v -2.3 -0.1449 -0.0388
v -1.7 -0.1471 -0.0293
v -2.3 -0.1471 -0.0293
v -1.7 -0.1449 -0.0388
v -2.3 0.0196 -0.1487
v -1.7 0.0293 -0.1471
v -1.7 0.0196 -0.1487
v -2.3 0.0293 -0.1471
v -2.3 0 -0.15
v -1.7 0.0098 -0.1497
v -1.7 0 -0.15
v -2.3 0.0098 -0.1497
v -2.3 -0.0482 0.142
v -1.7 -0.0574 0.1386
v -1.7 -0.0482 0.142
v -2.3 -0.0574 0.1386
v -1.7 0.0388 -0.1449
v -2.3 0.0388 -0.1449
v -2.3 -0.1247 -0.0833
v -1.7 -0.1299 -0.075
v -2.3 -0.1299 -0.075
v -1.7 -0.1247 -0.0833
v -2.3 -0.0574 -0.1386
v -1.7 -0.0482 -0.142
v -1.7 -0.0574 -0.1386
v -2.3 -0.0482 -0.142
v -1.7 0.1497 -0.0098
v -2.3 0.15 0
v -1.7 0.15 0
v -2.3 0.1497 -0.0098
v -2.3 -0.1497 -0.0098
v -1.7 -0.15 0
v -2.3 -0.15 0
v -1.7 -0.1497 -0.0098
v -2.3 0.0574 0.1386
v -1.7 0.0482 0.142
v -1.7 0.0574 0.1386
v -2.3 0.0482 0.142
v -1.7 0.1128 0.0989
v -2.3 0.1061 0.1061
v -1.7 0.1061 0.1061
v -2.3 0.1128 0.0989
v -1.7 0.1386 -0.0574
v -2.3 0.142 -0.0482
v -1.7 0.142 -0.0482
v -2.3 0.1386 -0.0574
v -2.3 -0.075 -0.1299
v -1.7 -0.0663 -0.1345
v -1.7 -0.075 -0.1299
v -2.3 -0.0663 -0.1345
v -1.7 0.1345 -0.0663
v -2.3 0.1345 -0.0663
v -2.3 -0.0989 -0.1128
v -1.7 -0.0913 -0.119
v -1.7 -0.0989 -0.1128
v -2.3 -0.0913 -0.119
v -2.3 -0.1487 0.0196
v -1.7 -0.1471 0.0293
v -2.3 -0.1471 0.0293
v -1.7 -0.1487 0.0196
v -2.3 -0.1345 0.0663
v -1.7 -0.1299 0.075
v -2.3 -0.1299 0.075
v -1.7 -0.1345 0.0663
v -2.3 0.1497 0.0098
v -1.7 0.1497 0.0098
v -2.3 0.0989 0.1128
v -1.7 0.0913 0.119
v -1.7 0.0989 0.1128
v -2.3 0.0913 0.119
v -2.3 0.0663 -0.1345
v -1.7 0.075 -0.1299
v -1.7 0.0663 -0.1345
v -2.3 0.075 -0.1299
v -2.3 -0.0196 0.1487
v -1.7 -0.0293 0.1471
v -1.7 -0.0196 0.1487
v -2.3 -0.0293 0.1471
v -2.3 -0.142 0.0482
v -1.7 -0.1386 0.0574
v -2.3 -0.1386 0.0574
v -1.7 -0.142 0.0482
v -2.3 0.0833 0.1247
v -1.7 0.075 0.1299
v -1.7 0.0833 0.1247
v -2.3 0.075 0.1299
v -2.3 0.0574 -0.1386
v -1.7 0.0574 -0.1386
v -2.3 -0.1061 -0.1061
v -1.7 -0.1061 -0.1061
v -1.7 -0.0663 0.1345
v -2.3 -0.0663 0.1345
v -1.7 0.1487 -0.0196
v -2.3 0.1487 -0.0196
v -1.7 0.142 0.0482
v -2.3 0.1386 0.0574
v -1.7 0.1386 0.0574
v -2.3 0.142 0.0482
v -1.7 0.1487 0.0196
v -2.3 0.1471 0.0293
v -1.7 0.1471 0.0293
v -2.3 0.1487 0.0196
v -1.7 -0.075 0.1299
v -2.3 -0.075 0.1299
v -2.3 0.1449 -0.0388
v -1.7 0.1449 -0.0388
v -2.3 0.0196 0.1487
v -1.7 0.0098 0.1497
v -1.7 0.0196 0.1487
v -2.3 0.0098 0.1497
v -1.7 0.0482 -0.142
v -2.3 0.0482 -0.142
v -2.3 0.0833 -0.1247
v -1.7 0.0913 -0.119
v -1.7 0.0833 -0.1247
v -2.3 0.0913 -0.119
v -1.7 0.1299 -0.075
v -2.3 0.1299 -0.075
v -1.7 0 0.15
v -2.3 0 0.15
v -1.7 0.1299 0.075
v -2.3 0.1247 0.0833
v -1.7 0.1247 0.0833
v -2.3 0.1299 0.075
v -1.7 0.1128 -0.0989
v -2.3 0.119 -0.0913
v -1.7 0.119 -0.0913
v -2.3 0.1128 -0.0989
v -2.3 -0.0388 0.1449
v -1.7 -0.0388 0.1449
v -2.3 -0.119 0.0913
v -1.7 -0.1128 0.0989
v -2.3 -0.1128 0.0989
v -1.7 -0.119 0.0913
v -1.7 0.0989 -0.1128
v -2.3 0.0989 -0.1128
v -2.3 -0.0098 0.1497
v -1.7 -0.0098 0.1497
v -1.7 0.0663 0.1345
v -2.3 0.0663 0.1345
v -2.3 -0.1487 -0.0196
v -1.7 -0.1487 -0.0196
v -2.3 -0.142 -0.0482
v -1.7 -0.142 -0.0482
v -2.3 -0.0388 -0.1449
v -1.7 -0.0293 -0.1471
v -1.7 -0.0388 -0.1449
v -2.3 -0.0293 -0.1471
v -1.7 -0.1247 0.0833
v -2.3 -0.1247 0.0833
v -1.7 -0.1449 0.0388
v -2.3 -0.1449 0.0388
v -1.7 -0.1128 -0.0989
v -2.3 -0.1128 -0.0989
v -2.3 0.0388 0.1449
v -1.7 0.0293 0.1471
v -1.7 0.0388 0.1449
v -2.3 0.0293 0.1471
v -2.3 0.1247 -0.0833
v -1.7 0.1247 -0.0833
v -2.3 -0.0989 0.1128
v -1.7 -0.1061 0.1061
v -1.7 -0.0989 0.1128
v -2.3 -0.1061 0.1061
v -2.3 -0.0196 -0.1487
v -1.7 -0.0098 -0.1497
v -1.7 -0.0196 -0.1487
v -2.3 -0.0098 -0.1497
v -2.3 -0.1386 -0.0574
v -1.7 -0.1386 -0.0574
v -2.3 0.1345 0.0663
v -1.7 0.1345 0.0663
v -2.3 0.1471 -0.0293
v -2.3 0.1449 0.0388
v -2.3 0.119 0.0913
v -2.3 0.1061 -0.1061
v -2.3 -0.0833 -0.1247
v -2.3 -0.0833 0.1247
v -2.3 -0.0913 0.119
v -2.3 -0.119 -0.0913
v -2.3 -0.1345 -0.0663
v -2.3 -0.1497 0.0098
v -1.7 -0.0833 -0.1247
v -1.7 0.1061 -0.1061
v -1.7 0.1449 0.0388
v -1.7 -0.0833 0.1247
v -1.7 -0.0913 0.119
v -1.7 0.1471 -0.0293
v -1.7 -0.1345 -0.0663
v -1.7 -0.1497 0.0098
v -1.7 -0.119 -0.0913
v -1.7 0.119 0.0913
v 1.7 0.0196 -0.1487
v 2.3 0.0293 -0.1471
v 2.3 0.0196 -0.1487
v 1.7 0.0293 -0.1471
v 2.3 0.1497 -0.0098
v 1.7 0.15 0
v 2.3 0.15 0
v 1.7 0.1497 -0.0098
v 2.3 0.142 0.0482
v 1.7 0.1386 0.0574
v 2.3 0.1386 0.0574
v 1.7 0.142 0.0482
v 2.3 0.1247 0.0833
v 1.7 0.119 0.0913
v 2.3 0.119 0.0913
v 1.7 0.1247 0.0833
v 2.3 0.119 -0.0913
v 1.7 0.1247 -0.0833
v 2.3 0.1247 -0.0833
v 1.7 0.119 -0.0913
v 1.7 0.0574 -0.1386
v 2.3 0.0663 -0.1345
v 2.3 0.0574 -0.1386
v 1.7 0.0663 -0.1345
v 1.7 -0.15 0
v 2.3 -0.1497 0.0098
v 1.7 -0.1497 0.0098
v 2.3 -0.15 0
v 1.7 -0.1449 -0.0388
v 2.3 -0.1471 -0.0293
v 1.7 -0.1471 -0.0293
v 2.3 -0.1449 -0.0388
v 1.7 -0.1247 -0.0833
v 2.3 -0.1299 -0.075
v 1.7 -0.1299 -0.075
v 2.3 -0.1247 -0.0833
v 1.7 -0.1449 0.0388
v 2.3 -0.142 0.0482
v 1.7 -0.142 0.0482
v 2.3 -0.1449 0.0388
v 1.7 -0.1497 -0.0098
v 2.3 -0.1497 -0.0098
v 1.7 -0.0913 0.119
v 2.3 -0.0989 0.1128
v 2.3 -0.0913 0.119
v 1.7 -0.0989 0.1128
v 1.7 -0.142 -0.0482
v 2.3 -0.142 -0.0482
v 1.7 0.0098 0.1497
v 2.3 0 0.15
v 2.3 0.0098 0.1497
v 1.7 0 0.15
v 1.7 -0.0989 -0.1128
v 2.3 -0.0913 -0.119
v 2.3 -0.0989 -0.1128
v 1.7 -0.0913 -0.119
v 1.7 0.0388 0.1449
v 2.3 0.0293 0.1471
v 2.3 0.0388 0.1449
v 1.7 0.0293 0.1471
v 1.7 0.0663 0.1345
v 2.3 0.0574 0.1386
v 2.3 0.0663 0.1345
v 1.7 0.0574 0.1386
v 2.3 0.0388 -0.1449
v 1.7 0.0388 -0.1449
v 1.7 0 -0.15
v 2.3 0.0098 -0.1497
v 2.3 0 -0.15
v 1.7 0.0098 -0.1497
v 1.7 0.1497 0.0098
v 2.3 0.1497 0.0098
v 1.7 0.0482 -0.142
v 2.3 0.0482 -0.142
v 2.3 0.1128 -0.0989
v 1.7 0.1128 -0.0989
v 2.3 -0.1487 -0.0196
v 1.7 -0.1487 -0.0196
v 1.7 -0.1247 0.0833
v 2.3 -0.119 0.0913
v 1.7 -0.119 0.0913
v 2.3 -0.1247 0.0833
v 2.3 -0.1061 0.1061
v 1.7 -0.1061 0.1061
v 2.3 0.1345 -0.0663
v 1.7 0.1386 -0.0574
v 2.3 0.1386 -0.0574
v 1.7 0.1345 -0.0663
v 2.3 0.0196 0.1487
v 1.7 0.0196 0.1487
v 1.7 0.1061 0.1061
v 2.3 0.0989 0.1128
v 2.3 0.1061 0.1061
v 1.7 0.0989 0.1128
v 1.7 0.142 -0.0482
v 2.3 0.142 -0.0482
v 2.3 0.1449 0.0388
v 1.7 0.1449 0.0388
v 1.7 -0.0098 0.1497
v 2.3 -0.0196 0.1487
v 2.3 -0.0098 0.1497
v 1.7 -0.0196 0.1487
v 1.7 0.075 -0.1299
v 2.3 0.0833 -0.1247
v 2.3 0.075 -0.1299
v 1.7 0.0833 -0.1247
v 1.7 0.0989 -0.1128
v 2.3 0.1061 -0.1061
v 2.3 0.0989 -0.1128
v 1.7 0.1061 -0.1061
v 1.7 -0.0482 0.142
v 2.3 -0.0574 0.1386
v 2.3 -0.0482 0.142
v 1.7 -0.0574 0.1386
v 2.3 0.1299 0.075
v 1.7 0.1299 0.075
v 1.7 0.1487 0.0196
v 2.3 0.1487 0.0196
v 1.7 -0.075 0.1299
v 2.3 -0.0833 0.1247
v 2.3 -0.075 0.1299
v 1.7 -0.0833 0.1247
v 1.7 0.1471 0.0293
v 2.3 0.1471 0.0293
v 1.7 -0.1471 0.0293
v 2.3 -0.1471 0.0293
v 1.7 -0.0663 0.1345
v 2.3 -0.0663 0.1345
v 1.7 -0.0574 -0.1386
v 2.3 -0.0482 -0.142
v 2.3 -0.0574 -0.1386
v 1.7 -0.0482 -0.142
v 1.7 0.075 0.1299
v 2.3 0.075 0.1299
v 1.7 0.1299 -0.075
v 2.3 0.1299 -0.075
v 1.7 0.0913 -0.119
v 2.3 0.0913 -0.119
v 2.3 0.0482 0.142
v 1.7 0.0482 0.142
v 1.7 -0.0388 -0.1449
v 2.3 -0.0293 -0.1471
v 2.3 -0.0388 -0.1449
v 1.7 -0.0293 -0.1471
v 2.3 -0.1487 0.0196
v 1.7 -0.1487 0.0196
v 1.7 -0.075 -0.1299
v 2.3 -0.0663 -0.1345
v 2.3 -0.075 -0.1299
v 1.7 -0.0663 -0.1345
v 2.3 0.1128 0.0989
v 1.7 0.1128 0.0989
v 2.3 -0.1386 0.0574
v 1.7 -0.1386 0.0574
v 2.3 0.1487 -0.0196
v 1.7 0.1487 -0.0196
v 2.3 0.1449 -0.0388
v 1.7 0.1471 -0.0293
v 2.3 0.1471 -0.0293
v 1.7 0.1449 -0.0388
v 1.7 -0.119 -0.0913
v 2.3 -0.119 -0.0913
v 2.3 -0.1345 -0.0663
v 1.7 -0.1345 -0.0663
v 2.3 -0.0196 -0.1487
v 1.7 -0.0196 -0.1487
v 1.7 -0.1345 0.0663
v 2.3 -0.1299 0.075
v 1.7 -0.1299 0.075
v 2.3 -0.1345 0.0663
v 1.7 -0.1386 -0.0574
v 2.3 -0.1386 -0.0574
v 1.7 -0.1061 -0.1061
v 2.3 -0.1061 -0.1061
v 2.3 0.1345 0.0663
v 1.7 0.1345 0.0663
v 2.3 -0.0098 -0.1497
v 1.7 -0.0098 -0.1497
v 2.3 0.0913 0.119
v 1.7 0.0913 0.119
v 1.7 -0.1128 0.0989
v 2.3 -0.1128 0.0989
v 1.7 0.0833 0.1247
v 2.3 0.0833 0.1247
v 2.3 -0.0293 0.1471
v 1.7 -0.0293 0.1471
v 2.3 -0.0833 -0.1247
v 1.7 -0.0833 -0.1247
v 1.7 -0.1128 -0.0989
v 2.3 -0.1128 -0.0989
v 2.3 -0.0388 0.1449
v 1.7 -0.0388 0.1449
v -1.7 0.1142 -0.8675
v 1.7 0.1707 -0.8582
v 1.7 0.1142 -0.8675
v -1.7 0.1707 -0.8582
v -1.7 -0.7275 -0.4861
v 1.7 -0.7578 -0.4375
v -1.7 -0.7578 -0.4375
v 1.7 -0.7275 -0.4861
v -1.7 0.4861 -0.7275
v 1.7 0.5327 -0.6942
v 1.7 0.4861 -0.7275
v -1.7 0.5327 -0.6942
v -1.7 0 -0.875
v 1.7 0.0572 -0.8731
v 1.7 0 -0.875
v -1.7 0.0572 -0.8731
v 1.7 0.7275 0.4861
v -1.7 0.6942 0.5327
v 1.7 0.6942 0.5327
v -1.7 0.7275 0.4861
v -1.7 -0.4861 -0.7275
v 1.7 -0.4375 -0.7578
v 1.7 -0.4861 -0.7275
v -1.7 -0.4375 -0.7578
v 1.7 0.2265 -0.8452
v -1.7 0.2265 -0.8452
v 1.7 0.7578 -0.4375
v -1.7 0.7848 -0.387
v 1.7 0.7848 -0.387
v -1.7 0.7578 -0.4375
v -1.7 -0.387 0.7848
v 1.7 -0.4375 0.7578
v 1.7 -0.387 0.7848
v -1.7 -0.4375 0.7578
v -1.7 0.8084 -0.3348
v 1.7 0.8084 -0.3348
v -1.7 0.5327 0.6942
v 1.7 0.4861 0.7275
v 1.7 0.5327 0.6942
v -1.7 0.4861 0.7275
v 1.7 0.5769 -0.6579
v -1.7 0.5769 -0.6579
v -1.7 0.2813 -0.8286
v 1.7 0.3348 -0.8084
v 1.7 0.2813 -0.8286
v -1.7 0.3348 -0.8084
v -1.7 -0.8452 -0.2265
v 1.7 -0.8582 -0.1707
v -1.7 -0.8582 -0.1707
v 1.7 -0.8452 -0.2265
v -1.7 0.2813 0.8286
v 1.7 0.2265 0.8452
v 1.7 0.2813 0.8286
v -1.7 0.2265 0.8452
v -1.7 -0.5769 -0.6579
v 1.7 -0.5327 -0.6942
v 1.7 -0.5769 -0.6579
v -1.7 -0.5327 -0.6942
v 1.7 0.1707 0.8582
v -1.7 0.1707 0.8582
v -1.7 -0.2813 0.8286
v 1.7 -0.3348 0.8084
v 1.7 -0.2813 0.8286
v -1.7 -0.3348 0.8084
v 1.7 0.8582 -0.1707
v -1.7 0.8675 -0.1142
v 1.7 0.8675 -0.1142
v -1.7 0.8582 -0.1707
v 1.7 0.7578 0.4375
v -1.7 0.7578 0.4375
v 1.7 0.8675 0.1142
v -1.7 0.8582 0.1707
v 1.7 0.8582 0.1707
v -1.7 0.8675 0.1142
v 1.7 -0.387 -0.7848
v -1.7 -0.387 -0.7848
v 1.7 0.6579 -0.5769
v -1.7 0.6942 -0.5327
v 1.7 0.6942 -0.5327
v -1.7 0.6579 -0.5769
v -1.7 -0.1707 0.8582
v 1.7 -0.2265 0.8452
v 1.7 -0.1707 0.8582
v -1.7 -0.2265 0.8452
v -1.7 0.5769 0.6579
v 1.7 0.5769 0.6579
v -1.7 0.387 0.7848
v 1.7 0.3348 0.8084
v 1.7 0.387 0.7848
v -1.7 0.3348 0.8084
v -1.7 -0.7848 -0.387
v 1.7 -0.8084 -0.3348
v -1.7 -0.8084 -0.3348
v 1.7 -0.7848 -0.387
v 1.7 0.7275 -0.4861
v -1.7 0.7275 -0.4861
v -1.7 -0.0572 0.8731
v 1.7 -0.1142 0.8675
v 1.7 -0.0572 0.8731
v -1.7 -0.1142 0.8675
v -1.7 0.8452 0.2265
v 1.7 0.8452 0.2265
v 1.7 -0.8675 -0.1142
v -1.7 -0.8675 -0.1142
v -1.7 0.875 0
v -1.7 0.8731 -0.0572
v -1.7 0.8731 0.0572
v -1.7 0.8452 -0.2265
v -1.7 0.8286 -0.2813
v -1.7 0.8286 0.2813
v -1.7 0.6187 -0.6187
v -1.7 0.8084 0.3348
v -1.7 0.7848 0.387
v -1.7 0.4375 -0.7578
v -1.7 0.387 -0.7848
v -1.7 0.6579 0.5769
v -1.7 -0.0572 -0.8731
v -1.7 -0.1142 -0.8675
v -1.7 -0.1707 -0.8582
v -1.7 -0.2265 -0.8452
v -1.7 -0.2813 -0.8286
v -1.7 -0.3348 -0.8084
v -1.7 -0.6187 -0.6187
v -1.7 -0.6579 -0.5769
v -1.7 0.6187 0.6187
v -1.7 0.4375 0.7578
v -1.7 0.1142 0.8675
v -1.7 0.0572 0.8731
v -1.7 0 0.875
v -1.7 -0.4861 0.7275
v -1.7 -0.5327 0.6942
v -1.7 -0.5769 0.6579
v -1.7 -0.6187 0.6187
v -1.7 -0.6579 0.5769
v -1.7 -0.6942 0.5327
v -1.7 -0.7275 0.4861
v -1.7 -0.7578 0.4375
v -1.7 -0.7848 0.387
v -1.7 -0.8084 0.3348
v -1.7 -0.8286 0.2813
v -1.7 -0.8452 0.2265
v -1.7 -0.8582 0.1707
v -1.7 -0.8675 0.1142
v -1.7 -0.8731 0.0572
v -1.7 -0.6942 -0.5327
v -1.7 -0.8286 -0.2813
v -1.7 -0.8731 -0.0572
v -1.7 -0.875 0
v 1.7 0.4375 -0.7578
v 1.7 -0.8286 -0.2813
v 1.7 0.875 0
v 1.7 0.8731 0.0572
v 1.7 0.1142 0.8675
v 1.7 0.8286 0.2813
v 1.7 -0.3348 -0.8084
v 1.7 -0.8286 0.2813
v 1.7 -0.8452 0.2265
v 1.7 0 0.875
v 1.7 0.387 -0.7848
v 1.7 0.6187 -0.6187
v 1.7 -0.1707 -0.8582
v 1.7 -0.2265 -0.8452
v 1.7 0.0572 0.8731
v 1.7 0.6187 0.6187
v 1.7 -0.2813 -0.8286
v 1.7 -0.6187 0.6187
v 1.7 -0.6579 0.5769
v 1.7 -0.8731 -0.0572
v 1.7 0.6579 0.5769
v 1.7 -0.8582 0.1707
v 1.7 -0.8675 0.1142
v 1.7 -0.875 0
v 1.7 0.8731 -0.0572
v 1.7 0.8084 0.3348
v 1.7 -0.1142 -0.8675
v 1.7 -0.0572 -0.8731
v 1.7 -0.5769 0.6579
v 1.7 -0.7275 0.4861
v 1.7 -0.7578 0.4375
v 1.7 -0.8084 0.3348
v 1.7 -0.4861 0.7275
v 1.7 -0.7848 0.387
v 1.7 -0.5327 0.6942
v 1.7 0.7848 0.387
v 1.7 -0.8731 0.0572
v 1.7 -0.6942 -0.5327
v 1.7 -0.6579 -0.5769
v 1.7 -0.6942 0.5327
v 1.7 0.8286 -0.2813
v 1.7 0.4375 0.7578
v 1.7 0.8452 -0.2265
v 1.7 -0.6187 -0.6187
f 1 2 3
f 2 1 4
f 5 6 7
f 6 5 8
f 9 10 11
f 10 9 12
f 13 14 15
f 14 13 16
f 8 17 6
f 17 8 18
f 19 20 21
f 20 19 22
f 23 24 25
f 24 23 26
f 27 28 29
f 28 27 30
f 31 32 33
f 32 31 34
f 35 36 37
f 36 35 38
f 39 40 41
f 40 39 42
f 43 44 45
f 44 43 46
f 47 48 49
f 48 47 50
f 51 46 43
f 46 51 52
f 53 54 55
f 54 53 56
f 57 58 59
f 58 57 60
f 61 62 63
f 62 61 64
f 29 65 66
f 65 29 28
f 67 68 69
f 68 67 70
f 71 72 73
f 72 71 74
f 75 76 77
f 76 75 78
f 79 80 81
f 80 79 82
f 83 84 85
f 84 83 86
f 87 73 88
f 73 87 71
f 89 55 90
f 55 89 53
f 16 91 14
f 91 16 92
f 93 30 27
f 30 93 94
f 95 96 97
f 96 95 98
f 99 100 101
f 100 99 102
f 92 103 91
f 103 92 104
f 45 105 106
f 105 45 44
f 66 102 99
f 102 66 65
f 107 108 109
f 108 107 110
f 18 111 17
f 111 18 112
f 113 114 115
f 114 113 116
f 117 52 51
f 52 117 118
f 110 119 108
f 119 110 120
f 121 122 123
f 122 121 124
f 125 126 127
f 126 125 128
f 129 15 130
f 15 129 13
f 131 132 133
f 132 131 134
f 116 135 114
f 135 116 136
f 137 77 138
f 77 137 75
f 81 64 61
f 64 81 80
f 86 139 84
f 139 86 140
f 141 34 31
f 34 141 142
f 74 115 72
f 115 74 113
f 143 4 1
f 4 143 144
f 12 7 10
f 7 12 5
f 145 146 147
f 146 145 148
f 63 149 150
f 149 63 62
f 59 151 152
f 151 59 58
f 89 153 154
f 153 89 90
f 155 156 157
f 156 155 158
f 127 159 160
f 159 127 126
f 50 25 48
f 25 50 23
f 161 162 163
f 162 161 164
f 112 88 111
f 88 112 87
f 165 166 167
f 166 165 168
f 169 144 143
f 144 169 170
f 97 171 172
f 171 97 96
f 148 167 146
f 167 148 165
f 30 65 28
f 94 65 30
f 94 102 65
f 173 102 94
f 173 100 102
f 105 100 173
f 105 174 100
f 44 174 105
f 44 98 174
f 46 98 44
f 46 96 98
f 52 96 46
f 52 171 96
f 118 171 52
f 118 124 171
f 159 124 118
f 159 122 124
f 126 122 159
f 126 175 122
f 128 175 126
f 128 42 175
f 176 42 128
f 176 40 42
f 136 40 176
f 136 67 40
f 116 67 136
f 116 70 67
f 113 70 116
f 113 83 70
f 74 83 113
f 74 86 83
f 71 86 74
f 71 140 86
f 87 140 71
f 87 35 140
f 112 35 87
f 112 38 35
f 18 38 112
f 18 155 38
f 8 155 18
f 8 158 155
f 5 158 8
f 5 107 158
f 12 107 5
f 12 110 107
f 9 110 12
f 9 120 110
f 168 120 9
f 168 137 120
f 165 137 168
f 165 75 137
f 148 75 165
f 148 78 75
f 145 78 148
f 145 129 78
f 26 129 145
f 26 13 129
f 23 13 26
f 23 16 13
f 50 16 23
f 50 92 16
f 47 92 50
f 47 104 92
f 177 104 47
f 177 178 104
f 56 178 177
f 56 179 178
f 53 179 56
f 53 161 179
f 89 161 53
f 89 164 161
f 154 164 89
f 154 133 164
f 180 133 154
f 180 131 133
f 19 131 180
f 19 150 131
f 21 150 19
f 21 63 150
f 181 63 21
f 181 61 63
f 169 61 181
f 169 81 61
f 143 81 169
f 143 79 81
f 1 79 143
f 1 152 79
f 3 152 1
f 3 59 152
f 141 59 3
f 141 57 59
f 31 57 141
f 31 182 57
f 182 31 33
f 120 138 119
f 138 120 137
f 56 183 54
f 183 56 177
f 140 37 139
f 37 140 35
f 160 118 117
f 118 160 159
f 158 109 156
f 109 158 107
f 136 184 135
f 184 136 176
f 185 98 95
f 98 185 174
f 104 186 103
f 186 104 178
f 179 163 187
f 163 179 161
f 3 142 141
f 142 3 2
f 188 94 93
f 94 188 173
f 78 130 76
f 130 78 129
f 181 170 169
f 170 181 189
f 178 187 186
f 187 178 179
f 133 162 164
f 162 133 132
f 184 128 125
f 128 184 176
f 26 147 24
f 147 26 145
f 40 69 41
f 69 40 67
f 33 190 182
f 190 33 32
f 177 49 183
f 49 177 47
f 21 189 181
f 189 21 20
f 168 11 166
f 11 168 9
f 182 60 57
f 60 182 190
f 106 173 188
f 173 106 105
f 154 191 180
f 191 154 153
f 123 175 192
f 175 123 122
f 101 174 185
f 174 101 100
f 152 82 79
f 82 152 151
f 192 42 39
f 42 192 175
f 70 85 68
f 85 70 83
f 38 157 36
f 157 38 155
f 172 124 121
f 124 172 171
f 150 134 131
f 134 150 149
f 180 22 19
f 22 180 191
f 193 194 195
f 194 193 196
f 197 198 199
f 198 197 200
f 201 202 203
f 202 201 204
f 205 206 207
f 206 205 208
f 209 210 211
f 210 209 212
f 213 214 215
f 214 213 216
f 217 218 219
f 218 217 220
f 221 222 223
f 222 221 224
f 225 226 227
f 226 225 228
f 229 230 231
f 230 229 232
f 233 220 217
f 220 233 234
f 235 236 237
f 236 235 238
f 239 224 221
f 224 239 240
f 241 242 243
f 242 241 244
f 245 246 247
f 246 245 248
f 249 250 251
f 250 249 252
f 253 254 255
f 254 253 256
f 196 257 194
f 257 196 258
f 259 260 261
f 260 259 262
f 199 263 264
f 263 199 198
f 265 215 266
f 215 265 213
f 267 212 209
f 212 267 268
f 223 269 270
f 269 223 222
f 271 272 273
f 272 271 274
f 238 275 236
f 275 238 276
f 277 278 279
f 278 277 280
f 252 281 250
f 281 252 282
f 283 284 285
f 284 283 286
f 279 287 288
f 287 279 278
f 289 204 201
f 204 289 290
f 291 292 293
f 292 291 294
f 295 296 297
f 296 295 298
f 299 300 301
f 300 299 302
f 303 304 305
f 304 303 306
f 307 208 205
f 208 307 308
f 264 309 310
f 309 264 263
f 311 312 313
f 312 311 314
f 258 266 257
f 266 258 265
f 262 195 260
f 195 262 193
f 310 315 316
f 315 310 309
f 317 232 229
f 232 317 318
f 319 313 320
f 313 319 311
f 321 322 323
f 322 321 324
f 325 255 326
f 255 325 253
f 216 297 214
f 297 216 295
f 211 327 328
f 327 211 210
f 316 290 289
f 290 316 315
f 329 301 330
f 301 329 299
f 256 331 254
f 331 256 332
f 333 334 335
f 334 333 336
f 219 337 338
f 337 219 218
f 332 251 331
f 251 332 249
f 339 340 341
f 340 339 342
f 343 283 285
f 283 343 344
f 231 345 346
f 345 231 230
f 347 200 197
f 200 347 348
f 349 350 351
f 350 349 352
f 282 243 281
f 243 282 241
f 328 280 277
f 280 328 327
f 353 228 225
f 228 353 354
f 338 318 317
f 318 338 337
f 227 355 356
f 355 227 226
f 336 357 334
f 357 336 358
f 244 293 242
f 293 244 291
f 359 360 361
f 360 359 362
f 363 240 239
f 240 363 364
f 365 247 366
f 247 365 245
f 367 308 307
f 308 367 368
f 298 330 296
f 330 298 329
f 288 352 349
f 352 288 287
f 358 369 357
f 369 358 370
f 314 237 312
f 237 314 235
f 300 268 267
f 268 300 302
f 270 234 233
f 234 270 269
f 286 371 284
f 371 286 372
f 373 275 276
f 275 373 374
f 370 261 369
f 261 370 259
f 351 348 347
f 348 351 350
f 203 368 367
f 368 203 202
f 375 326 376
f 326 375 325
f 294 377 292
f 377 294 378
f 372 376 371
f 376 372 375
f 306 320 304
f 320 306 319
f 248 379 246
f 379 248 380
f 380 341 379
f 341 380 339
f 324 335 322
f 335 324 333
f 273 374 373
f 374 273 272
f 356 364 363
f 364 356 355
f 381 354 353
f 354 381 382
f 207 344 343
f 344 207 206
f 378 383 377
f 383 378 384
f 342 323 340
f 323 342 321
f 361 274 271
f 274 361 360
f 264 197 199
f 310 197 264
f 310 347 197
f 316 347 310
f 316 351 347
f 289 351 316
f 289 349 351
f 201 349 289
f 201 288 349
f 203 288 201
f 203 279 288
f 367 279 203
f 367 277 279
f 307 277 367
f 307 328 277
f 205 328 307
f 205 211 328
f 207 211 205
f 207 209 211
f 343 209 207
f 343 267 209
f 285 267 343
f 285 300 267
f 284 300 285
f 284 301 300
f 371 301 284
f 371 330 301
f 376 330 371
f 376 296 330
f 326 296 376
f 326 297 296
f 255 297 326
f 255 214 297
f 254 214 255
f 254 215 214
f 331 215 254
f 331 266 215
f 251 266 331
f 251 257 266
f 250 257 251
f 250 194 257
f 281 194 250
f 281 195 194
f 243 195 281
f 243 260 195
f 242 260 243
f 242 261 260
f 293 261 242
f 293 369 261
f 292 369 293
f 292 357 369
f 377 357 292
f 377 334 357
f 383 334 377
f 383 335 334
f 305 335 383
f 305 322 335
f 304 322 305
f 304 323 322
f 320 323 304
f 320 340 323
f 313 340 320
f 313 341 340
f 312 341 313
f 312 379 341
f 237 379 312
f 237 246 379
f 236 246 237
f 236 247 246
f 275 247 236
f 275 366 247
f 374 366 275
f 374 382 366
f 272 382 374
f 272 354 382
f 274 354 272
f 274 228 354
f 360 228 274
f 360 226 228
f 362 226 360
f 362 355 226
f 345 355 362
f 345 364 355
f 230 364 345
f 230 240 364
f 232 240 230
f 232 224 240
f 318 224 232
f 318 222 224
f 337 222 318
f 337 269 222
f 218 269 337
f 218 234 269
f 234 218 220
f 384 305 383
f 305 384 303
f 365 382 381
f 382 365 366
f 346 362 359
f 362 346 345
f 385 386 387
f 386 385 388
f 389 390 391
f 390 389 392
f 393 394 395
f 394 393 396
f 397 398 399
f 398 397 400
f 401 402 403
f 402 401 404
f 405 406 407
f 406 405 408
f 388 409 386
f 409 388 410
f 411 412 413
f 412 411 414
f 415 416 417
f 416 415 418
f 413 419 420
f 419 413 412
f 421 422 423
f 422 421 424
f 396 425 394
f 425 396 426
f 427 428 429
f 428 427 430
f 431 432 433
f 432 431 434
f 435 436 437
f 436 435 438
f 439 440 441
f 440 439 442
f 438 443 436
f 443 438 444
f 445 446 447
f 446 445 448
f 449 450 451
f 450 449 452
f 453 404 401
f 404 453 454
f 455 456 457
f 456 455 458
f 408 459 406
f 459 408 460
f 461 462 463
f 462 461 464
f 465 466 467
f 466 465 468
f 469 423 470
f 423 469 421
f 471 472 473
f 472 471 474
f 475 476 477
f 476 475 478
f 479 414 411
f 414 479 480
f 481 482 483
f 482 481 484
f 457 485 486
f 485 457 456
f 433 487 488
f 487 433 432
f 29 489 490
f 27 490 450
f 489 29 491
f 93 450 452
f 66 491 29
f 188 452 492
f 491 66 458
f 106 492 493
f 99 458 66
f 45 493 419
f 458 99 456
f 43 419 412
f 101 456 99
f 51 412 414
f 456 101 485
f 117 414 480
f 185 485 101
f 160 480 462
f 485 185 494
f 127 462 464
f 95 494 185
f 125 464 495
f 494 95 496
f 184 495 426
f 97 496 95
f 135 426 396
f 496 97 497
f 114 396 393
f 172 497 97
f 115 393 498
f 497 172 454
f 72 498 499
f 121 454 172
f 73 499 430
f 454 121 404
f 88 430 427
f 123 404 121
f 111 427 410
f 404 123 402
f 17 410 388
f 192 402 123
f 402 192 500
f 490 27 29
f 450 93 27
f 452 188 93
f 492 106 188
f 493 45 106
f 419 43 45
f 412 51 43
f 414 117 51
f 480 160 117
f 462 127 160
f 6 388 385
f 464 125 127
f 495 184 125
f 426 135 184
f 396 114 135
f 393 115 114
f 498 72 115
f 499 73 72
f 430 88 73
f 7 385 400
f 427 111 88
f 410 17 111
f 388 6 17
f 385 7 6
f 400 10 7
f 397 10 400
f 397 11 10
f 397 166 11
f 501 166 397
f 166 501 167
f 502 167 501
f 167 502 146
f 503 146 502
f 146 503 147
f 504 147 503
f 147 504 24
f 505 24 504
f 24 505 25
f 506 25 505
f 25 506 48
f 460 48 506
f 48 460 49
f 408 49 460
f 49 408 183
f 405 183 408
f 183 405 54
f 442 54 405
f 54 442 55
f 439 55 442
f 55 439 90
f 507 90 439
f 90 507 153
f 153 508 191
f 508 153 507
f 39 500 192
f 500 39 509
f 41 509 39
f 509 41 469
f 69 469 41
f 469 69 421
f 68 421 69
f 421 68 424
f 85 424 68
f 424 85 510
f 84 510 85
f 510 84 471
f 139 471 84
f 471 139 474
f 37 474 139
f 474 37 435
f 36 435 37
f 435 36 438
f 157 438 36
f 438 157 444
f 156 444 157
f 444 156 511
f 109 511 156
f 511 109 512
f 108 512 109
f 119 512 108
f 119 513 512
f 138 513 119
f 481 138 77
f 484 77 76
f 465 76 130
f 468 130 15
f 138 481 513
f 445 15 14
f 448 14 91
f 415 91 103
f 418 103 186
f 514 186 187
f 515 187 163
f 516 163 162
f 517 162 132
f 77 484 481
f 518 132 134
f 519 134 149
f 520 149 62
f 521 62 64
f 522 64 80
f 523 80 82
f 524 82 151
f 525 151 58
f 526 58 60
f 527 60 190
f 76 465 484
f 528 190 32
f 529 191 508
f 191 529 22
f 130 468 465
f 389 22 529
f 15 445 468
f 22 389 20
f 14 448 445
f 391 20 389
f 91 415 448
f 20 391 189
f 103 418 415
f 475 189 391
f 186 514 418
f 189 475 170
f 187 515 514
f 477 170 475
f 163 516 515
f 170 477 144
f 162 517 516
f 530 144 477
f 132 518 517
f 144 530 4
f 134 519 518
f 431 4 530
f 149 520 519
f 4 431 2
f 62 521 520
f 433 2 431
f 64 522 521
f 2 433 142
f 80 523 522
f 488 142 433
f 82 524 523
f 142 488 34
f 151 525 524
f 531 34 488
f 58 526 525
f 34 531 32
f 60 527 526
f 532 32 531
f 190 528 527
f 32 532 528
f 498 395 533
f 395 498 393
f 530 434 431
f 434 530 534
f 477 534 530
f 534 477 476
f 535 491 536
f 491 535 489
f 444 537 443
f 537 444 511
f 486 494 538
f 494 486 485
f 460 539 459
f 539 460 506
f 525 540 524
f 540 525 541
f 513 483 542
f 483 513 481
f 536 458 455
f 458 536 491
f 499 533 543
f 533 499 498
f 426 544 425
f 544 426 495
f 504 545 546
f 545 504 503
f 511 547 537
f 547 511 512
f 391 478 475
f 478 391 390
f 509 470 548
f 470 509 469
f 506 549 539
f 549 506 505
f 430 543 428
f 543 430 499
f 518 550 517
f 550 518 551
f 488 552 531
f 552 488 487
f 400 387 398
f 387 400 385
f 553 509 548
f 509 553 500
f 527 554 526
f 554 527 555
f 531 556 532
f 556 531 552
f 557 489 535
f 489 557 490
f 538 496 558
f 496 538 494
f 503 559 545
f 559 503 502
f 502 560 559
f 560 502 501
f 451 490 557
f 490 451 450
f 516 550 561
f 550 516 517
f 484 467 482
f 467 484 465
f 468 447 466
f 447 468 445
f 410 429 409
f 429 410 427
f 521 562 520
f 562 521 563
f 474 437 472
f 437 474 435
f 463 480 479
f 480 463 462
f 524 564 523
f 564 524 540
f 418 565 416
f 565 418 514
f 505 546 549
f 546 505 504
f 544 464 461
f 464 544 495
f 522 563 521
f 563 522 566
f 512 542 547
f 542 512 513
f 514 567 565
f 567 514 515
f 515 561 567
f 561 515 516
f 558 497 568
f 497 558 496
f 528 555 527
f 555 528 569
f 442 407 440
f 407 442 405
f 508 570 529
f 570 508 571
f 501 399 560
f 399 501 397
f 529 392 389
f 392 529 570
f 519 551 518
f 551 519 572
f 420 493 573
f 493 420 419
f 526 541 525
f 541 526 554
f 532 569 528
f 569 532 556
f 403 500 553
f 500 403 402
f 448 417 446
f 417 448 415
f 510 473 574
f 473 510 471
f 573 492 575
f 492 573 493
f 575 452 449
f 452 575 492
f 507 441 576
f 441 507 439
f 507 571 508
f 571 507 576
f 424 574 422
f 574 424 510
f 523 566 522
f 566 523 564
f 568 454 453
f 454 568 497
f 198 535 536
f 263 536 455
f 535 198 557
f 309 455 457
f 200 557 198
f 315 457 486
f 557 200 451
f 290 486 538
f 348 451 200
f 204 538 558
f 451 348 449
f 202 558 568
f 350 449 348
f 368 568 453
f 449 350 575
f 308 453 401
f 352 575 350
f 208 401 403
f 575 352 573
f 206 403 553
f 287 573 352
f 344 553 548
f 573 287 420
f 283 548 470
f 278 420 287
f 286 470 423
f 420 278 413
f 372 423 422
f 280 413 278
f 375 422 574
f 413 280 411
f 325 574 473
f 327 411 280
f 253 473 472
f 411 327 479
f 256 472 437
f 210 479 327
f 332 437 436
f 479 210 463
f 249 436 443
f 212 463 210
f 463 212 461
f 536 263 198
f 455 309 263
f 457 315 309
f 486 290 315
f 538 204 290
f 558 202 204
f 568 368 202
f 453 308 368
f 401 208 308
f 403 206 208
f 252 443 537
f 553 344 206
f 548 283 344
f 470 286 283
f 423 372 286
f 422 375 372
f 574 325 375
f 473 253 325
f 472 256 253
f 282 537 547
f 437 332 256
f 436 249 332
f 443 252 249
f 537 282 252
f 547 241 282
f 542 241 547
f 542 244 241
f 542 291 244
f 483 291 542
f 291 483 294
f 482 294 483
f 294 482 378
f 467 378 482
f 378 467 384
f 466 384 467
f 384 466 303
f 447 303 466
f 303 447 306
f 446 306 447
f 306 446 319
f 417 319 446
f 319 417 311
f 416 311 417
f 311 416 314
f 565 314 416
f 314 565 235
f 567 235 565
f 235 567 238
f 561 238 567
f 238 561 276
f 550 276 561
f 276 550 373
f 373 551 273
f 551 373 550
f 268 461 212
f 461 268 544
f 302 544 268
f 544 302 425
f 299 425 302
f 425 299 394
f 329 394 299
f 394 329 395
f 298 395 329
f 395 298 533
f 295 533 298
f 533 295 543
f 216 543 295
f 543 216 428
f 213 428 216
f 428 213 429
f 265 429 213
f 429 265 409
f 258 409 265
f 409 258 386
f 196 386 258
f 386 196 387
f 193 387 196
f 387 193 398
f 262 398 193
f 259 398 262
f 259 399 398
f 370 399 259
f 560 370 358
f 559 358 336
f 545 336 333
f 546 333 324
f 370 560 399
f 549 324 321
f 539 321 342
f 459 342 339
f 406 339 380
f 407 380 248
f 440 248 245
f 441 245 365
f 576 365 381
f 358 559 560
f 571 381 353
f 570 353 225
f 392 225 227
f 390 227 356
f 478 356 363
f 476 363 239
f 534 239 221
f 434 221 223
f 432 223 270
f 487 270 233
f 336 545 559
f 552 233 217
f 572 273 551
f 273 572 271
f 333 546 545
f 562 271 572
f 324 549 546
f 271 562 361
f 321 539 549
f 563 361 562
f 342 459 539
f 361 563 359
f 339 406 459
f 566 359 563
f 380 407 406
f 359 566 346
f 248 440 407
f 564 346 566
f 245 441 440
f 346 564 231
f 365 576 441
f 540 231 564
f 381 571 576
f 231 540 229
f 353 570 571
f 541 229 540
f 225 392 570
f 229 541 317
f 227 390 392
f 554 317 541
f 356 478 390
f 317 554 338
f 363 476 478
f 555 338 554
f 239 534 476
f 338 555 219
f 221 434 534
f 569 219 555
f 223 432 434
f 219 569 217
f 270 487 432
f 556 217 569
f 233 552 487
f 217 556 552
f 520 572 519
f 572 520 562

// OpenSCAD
// Axial component sized to: [3.4, 1.75, 0.3]
// Interpreted as: body_length=3.4, body_diameter=1.75, lead_diameter=0.3
// Single connected solid (body + two leads)

$fn = 96;

// Parameters
body_length   = 3.4;   // along X
body_diameter = 1.75;  // body OD
lead_diameter = 0.3;   // lead OD

// Keep leads short so overall form matches the requested axial dimensions
lead_length_each = 0.6;     // per side (kept minimal to avoid long detached bars)
overlap = 0.05;             // small overlap to guarantee manifold union

module body() {
    rotate([0, 90, 0])
        cylinder(h=body_length, r=body_diameter/2, center=true);
}

module leads() {
    // Leads extend from each end of the body along X and overlap slightly into the body
    for (sx = [-1, 1]) {
        translate([sx * (body_length/2 + lead_length_each/2 - overlap), 0, 0])
            rotate([0, 90, 0])
                cylinder(h=lead_length_each + 2*overlap, r=lead_diameter/2, center=true);
    }
}

union() {
    body();
    leads();
}
